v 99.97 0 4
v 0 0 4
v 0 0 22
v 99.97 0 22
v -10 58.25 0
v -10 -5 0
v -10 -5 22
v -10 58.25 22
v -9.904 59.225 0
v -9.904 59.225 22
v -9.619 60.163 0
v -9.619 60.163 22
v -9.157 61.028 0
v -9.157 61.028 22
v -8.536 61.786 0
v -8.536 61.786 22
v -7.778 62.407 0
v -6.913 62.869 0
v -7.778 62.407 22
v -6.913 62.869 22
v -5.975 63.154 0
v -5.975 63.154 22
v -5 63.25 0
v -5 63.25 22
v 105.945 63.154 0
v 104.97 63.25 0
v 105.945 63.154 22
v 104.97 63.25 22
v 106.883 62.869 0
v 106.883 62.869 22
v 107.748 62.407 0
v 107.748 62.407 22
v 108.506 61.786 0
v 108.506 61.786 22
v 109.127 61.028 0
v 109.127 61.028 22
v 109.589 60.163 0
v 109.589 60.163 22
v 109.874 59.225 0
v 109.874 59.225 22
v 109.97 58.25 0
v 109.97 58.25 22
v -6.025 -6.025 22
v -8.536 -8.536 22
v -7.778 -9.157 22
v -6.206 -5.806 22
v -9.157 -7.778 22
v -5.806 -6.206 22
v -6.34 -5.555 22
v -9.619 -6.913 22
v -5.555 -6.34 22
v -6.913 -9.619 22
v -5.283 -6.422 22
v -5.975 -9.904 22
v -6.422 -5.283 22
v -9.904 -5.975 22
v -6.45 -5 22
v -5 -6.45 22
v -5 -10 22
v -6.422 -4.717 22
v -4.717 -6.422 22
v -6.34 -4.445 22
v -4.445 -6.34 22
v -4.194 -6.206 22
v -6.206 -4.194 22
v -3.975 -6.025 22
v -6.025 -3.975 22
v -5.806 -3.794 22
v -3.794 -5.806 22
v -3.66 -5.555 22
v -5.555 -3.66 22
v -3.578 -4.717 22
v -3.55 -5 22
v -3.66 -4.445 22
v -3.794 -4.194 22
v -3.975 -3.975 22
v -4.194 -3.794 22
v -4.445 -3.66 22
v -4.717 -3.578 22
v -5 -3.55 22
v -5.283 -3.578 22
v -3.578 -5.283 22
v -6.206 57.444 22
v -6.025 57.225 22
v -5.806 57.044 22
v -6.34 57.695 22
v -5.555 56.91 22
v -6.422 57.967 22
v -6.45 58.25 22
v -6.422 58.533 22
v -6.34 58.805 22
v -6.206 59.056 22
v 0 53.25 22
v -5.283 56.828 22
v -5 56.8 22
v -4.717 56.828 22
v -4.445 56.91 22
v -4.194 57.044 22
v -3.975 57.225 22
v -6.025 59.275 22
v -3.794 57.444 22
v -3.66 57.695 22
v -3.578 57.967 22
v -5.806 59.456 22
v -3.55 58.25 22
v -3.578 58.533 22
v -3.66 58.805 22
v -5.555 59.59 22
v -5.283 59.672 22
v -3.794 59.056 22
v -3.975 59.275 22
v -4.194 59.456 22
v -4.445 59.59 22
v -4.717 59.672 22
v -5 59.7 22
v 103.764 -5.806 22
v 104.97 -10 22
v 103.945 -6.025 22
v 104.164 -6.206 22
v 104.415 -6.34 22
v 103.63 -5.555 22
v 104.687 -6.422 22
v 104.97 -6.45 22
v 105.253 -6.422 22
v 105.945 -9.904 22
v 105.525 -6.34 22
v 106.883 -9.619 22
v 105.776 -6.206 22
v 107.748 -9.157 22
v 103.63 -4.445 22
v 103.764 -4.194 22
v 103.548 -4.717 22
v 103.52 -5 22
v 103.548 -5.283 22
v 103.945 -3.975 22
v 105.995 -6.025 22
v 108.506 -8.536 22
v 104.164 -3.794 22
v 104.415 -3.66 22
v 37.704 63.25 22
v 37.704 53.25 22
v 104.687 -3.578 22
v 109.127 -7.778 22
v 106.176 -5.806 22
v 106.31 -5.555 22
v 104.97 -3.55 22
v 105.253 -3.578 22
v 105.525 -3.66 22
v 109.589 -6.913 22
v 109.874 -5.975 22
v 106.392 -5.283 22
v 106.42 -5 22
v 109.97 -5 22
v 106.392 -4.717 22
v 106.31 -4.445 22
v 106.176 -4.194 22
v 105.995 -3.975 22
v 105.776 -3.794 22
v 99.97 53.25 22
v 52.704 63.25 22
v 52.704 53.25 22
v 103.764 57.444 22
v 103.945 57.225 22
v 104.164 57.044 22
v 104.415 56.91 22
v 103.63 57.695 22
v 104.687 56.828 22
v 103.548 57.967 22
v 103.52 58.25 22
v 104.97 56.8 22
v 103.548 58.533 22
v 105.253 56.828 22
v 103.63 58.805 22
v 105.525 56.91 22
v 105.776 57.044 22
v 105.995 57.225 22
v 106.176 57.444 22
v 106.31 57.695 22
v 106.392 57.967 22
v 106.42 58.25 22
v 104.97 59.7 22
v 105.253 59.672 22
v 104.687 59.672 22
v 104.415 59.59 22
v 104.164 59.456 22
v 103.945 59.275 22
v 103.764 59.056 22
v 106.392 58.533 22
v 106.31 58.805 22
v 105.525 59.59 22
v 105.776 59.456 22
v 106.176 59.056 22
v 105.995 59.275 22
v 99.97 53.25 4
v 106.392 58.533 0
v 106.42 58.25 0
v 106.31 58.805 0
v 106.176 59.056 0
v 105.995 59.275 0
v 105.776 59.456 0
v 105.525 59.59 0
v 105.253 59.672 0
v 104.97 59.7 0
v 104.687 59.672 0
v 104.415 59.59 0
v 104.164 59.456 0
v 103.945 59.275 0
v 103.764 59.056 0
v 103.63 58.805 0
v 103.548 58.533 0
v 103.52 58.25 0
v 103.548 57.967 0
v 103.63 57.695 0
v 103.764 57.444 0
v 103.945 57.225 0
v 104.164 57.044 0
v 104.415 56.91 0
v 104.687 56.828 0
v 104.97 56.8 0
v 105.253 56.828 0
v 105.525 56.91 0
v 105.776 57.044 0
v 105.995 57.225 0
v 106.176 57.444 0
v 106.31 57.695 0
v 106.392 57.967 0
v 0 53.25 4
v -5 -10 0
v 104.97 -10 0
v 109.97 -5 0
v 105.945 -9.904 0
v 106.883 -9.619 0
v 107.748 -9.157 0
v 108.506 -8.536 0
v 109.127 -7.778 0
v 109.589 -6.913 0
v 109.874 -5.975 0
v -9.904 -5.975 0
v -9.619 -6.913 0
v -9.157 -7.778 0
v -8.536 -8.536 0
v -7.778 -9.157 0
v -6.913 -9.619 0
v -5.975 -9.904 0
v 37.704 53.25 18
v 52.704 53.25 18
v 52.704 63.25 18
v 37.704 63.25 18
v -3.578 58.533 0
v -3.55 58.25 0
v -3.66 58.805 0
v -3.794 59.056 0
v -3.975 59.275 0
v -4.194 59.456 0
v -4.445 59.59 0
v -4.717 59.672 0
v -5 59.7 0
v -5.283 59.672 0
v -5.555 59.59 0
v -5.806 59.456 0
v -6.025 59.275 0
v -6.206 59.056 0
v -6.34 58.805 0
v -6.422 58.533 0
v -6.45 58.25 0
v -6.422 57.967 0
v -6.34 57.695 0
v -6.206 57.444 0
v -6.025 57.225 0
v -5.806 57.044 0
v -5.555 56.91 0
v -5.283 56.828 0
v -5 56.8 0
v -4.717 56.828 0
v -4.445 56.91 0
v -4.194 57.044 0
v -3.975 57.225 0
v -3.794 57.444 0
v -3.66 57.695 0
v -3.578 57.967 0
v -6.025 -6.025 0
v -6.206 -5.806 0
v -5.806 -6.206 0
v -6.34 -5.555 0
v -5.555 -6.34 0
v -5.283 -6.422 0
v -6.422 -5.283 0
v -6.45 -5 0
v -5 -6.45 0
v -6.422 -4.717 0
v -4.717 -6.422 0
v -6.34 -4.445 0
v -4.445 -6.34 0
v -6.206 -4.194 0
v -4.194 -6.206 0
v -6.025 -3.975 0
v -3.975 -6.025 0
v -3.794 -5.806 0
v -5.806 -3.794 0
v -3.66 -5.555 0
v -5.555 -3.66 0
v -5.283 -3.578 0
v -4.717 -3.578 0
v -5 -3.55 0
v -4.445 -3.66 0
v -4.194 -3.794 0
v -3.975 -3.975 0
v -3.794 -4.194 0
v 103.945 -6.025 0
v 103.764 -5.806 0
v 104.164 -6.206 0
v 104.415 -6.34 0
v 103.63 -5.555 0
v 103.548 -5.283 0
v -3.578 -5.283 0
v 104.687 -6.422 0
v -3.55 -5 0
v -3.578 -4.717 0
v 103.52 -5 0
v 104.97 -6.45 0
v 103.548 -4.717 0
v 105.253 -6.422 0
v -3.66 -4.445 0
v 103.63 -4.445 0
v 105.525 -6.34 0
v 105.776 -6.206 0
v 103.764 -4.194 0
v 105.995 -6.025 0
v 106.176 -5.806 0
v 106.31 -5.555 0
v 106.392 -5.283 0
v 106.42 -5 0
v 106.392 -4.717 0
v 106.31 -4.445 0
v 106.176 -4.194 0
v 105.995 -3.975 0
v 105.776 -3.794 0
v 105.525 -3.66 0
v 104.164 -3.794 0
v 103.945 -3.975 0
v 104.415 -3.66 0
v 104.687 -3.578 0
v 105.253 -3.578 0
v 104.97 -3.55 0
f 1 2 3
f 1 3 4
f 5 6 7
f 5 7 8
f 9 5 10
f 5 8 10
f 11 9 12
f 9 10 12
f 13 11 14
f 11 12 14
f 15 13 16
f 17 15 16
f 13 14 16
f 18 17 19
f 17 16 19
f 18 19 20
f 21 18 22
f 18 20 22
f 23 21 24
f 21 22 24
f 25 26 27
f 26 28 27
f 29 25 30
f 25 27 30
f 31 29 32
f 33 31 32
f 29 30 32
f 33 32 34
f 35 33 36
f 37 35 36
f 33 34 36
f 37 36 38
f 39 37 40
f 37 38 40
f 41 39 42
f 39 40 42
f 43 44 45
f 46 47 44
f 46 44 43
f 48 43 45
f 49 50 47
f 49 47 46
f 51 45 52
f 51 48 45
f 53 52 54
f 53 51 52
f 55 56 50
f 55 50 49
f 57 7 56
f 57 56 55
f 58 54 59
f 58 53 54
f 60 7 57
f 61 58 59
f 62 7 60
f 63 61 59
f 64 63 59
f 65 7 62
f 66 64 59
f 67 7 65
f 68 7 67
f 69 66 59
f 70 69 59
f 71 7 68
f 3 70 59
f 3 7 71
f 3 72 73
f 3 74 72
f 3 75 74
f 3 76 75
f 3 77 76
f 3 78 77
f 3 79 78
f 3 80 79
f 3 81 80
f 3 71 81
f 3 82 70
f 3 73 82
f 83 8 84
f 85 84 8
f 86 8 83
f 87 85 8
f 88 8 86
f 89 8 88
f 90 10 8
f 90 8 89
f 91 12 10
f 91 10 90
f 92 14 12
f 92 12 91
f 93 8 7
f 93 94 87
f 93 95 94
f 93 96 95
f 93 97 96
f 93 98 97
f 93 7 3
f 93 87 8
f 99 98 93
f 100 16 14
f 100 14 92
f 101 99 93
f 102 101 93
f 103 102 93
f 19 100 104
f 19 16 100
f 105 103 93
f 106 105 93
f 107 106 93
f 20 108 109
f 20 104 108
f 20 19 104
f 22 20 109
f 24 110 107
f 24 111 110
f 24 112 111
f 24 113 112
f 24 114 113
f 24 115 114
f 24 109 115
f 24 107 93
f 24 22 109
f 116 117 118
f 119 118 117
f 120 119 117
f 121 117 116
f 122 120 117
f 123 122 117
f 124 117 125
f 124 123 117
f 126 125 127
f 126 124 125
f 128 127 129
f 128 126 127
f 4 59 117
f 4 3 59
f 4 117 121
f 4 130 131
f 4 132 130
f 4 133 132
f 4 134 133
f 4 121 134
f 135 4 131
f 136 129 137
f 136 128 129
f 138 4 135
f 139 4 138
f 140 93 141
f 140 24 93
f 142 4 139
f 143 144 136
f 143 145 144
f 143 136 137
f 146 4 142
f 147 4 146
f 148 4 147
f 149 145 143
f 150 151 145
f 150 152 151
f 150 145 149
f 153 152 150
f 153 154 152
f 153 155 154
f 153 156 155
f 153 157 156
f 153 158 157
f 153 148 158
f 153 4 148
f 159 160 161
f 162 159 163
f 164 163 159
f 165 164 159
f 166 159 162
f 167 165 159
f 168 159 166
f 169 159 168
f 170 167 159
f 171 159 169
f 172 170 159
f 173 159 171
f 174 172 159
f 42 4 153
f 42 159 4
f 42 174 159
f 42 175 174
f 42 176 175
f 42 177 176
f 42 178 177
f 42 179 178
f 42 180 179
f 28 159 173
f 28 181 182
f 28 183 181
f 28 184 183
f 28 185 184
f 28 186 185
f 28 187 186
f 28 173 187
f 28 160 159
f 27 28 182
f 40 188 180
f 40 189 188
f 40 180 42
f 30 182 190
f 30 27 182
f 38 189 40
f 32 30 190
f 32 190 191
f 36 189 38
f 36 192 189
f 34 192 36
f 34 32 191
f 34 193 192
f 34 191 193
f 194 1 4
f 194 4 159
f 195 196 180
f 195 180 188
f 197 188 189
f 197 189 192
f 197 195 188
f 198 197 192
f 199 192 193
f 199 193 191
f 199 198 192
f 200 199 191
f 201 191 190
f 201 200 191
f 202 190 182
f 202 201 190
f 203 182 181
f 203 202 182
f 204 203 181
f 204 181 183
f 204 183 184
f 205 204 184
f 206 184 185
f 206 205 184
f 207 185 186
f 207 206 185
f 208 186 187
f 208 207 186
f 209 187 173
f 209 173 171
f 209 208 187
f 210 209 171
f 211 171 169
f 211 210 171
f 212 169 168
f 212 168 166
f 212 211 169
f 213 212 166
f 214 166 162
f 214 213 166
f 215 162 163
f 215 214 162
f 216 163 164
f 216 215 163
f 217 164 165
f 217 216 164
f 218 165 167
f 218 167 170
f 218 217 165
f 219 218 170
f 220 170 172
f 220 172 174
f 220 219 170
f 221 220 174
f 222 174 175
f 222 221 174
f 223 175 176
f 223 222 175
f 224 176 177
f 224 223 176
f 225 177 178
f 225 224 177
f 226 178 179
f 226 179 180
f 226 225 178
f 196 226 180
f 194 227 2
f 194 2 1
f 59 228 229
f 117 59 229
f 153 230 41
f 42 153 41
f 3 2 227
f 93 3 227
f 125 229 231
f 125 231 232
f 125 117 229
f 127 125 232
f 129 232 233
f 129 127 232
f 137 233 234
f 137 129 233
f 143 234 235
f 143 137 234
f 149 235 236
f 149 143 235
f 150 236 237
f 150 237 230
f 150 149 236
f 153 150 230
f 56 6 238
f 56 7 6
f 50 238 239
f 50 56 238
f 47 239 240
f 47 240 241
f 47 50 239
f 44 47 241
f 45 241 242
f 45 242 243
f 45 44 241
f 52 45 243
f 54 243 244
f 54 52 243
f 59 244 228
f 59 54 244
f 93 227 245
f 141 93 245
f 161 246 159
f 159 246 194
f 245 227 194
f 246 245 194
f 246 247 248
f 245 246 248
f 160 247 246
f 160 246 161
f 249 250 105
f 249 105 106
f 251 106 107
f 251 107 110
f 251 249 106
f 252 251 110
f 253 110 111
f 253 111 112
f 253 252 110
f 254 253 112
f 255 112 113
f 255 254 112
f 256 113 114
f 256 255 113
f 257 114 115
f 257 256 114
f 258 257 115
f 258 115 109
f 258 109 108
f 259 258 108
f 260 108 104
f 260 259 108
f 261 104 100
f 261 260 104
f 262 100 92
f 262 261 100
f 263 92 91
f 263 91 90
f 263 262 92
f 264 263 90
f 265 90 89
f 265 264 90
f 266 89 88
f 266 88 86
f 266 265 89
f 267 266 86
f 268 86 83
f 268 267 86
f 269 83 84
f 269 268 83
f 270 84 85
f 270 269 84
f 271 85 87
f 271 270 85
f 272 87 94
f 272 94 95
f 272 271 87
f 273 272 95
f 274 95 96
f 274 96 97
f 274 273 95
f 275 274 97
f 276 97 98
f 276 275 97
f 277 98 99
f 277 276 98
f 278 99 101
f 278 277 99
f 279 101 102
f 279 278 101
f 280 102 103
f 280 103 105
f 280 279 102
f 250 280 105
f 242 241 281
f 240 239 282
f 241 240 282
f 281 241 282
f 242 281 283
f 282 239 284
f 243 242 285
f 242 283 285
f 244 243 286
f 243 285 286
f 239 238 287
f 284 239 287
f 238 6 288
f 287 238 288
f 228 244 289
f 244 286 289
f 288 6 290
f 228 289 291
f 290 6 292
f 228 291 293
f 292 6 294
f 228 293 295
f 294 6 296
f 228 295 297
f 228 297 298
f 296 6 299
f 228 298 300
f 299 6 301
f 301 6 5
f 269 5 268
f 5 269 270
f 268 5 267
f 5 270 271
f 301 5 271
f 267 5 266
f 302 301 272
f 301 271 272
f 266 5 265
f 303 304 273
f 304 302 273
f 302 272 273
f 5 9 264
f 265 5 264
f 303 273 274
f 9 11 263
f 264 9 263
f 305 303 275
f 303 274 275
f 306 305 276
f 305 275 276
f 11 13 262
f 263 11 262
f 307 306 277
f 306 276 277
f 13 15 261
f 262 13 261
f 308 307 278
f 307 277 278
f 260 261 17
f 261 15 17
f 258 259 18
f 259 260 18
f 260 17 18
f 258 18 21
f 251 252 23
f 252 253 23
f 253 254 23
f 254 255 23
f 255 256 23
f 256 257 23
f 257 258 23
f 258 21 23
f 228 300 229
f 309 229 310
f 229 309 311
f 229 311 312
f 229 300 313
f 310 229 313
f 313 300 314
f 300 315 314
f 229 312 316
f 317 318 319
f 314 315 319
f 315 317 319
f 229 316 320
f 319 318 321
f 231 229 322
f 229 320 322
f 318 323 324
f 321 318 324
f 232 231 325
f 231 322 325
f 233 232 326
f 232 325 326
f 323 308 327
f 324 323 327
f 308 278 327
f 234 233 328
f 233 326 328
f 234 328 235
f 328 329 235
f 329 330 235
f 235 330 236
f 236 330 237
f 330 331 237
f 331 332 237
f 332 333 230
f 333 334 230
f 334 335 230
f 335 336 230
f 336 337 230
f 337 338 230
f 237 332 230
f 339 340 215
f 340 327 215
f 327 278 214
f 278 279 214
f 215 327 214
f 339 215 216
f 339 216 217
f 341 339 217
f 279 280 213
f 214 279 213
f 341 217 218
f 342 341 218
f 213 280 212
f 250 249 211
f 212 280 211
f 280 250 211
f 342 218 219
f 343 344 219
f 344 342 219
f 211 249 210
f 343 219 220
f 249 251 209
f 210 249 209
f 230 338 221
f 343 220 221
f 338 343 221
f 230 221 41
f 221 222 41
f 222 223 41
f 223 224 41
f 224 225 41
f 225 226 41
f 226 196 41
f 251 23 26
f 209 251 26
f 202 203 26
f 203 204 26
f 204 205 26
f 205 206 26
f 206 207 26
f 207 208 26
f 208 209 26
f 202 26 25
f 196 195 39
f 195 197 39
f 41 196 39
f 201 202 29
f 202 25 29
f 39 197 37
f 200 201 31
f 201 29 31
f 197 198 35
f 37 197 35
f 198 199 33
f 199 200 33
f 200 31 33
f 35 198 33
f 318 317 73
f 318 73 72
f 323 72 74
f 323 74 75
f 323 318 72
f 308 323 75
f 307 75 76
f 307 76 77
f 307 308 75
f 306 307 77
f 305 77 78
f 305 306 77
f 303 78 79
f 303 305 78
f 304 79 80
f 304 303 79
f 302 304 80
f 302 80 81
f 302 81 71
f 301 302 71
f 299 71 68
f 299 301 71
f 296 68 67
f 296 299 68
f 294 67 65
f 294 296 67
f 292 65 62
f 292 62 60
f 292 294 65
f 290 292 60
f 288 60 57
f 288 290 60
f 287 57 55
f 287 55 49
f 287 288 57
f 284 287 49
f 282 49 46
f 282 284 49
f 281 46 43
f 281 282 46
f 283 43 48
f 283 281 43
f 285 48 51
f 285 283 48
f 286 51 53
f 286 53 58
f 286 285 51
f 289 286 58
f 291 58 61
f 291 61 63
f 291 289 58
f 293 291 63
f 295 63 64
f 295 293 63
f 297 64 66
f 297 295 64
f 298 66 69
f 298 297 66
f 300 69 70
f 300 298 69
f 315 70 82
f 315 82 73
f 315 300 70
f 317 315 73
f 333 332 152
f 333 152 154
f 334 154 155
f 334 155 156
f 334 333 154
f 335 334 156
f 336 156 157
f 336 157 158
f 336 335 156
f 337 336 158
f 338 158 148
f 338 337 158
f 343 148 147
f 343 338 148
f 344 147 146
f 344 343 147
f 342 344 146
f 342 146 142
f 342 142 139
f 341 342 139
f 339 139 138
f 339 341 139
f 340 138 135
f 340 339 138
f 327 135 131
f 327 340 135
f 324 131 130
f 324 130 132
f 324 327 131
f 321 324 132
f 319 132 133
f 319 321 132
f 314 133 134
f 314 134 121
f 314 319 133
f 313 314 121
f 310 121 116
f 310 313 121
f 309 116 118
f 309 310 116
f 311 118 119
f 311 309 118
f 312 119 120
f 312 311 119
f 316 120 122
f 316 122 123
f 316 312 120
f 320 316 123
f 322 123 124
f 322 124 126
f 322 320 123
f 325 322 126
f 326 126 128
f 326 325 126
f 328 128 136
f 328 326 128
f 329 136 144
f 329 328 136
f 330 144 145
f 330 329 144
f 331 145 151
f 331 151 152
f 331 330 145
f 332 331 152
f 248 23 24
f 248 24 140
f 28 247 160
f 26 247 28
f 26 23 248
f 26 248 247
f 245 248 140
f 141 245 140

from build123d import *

# Parameters (mm, degrees)
SKETCH004_W      = 15
SKETCH004_H      = 4
EXTRUDE004_DEPTH = 10
SKETCH001_W      = 119.97
SKETCH001_H      = 73.25
SKETCH001_R      = 1.45
SKETCH001_W_2    = 99.97
SKETCH001_H_2    = 53.25
EXTRUDE001_DEPTH = 22
SKETCH_W         = 99.97
SKETCH_H         = 53.25
EXTRUDE_DEPTH    = 4
FILLET_R         = 5


with BuildPart() as extrude004:
    # Sketch004 (on Face4 of Fusion) → Extrude004 (new body)
    with BuildSketch(Plane(origin=(0, 63.25, 0), x_dir=(-1, 0, 0), z_dir=(0, 1, 0))):
        with Locations((-45.204, 20)):
            Rectangle(SKETCH004_W, SKETCH004_H)
    extrude(amount=-EXTRUDE004_DEPTH)


with BuildPart() as extrude001:
    # Sketch001 (on Sketch) → Extrude001 (new body)
    with BuildSketch(Plane.XY):
        with Locations((49.985, 26.625)):
            Rectangle(SKETCH001_W, SKETCH001_H)
        with Locations((104.97, 58.25)):
            Circle(SKETCH001_R, mode=Mode.SUBTRACT)
        with Locations((104.97, -5)):
            Circle(SKETCH001_R, mode=Mode.SUBTRACT)
        with Locations((-5, -5)):
            Circle(SKETCH001_R, mode=Mode.SUBTRACT)
        with Locations((-5, 58.25)):
            Circle(SKETCH001_R, mode=Mode.SUBTRACT)
        with Locations((49.985, 26.625)):
            Rectangle(SKETCH001_W_2, SKETCH001_H_2, mode=Mode.SUBTRACT)
    extrude(amount=EXTRUDE001_DEPTH)


with BuildPart() as fillet_body:
    # Sketch → Extrude (new body)
    with BuildSketch(Plane.XY):
        with Locations((49.985, 26.625)):
            Rectangle(SKETCH_W, SKETCH_H)
    extrude(amount=EXTRUDE_DEPTH)

    # Fusion: union Extrude001
    add(extrude001.part)

    # Cut001: cut Extrude004
    add(extrude004.part, mode=Mode.SUBTRACT)

    # Fillet
    fillet_edges = [fillet_body.edges().sort_by_distance(p)[0] for p in [
        (-10, 63.25, 11),
        (-10, -10, 11),
        (109.97, 63.25, 11),
        (109.97, -10, 11),
    ]]
    fillet(fillet_edges, radius=FILLET_R)


solid = fillet_body.part
